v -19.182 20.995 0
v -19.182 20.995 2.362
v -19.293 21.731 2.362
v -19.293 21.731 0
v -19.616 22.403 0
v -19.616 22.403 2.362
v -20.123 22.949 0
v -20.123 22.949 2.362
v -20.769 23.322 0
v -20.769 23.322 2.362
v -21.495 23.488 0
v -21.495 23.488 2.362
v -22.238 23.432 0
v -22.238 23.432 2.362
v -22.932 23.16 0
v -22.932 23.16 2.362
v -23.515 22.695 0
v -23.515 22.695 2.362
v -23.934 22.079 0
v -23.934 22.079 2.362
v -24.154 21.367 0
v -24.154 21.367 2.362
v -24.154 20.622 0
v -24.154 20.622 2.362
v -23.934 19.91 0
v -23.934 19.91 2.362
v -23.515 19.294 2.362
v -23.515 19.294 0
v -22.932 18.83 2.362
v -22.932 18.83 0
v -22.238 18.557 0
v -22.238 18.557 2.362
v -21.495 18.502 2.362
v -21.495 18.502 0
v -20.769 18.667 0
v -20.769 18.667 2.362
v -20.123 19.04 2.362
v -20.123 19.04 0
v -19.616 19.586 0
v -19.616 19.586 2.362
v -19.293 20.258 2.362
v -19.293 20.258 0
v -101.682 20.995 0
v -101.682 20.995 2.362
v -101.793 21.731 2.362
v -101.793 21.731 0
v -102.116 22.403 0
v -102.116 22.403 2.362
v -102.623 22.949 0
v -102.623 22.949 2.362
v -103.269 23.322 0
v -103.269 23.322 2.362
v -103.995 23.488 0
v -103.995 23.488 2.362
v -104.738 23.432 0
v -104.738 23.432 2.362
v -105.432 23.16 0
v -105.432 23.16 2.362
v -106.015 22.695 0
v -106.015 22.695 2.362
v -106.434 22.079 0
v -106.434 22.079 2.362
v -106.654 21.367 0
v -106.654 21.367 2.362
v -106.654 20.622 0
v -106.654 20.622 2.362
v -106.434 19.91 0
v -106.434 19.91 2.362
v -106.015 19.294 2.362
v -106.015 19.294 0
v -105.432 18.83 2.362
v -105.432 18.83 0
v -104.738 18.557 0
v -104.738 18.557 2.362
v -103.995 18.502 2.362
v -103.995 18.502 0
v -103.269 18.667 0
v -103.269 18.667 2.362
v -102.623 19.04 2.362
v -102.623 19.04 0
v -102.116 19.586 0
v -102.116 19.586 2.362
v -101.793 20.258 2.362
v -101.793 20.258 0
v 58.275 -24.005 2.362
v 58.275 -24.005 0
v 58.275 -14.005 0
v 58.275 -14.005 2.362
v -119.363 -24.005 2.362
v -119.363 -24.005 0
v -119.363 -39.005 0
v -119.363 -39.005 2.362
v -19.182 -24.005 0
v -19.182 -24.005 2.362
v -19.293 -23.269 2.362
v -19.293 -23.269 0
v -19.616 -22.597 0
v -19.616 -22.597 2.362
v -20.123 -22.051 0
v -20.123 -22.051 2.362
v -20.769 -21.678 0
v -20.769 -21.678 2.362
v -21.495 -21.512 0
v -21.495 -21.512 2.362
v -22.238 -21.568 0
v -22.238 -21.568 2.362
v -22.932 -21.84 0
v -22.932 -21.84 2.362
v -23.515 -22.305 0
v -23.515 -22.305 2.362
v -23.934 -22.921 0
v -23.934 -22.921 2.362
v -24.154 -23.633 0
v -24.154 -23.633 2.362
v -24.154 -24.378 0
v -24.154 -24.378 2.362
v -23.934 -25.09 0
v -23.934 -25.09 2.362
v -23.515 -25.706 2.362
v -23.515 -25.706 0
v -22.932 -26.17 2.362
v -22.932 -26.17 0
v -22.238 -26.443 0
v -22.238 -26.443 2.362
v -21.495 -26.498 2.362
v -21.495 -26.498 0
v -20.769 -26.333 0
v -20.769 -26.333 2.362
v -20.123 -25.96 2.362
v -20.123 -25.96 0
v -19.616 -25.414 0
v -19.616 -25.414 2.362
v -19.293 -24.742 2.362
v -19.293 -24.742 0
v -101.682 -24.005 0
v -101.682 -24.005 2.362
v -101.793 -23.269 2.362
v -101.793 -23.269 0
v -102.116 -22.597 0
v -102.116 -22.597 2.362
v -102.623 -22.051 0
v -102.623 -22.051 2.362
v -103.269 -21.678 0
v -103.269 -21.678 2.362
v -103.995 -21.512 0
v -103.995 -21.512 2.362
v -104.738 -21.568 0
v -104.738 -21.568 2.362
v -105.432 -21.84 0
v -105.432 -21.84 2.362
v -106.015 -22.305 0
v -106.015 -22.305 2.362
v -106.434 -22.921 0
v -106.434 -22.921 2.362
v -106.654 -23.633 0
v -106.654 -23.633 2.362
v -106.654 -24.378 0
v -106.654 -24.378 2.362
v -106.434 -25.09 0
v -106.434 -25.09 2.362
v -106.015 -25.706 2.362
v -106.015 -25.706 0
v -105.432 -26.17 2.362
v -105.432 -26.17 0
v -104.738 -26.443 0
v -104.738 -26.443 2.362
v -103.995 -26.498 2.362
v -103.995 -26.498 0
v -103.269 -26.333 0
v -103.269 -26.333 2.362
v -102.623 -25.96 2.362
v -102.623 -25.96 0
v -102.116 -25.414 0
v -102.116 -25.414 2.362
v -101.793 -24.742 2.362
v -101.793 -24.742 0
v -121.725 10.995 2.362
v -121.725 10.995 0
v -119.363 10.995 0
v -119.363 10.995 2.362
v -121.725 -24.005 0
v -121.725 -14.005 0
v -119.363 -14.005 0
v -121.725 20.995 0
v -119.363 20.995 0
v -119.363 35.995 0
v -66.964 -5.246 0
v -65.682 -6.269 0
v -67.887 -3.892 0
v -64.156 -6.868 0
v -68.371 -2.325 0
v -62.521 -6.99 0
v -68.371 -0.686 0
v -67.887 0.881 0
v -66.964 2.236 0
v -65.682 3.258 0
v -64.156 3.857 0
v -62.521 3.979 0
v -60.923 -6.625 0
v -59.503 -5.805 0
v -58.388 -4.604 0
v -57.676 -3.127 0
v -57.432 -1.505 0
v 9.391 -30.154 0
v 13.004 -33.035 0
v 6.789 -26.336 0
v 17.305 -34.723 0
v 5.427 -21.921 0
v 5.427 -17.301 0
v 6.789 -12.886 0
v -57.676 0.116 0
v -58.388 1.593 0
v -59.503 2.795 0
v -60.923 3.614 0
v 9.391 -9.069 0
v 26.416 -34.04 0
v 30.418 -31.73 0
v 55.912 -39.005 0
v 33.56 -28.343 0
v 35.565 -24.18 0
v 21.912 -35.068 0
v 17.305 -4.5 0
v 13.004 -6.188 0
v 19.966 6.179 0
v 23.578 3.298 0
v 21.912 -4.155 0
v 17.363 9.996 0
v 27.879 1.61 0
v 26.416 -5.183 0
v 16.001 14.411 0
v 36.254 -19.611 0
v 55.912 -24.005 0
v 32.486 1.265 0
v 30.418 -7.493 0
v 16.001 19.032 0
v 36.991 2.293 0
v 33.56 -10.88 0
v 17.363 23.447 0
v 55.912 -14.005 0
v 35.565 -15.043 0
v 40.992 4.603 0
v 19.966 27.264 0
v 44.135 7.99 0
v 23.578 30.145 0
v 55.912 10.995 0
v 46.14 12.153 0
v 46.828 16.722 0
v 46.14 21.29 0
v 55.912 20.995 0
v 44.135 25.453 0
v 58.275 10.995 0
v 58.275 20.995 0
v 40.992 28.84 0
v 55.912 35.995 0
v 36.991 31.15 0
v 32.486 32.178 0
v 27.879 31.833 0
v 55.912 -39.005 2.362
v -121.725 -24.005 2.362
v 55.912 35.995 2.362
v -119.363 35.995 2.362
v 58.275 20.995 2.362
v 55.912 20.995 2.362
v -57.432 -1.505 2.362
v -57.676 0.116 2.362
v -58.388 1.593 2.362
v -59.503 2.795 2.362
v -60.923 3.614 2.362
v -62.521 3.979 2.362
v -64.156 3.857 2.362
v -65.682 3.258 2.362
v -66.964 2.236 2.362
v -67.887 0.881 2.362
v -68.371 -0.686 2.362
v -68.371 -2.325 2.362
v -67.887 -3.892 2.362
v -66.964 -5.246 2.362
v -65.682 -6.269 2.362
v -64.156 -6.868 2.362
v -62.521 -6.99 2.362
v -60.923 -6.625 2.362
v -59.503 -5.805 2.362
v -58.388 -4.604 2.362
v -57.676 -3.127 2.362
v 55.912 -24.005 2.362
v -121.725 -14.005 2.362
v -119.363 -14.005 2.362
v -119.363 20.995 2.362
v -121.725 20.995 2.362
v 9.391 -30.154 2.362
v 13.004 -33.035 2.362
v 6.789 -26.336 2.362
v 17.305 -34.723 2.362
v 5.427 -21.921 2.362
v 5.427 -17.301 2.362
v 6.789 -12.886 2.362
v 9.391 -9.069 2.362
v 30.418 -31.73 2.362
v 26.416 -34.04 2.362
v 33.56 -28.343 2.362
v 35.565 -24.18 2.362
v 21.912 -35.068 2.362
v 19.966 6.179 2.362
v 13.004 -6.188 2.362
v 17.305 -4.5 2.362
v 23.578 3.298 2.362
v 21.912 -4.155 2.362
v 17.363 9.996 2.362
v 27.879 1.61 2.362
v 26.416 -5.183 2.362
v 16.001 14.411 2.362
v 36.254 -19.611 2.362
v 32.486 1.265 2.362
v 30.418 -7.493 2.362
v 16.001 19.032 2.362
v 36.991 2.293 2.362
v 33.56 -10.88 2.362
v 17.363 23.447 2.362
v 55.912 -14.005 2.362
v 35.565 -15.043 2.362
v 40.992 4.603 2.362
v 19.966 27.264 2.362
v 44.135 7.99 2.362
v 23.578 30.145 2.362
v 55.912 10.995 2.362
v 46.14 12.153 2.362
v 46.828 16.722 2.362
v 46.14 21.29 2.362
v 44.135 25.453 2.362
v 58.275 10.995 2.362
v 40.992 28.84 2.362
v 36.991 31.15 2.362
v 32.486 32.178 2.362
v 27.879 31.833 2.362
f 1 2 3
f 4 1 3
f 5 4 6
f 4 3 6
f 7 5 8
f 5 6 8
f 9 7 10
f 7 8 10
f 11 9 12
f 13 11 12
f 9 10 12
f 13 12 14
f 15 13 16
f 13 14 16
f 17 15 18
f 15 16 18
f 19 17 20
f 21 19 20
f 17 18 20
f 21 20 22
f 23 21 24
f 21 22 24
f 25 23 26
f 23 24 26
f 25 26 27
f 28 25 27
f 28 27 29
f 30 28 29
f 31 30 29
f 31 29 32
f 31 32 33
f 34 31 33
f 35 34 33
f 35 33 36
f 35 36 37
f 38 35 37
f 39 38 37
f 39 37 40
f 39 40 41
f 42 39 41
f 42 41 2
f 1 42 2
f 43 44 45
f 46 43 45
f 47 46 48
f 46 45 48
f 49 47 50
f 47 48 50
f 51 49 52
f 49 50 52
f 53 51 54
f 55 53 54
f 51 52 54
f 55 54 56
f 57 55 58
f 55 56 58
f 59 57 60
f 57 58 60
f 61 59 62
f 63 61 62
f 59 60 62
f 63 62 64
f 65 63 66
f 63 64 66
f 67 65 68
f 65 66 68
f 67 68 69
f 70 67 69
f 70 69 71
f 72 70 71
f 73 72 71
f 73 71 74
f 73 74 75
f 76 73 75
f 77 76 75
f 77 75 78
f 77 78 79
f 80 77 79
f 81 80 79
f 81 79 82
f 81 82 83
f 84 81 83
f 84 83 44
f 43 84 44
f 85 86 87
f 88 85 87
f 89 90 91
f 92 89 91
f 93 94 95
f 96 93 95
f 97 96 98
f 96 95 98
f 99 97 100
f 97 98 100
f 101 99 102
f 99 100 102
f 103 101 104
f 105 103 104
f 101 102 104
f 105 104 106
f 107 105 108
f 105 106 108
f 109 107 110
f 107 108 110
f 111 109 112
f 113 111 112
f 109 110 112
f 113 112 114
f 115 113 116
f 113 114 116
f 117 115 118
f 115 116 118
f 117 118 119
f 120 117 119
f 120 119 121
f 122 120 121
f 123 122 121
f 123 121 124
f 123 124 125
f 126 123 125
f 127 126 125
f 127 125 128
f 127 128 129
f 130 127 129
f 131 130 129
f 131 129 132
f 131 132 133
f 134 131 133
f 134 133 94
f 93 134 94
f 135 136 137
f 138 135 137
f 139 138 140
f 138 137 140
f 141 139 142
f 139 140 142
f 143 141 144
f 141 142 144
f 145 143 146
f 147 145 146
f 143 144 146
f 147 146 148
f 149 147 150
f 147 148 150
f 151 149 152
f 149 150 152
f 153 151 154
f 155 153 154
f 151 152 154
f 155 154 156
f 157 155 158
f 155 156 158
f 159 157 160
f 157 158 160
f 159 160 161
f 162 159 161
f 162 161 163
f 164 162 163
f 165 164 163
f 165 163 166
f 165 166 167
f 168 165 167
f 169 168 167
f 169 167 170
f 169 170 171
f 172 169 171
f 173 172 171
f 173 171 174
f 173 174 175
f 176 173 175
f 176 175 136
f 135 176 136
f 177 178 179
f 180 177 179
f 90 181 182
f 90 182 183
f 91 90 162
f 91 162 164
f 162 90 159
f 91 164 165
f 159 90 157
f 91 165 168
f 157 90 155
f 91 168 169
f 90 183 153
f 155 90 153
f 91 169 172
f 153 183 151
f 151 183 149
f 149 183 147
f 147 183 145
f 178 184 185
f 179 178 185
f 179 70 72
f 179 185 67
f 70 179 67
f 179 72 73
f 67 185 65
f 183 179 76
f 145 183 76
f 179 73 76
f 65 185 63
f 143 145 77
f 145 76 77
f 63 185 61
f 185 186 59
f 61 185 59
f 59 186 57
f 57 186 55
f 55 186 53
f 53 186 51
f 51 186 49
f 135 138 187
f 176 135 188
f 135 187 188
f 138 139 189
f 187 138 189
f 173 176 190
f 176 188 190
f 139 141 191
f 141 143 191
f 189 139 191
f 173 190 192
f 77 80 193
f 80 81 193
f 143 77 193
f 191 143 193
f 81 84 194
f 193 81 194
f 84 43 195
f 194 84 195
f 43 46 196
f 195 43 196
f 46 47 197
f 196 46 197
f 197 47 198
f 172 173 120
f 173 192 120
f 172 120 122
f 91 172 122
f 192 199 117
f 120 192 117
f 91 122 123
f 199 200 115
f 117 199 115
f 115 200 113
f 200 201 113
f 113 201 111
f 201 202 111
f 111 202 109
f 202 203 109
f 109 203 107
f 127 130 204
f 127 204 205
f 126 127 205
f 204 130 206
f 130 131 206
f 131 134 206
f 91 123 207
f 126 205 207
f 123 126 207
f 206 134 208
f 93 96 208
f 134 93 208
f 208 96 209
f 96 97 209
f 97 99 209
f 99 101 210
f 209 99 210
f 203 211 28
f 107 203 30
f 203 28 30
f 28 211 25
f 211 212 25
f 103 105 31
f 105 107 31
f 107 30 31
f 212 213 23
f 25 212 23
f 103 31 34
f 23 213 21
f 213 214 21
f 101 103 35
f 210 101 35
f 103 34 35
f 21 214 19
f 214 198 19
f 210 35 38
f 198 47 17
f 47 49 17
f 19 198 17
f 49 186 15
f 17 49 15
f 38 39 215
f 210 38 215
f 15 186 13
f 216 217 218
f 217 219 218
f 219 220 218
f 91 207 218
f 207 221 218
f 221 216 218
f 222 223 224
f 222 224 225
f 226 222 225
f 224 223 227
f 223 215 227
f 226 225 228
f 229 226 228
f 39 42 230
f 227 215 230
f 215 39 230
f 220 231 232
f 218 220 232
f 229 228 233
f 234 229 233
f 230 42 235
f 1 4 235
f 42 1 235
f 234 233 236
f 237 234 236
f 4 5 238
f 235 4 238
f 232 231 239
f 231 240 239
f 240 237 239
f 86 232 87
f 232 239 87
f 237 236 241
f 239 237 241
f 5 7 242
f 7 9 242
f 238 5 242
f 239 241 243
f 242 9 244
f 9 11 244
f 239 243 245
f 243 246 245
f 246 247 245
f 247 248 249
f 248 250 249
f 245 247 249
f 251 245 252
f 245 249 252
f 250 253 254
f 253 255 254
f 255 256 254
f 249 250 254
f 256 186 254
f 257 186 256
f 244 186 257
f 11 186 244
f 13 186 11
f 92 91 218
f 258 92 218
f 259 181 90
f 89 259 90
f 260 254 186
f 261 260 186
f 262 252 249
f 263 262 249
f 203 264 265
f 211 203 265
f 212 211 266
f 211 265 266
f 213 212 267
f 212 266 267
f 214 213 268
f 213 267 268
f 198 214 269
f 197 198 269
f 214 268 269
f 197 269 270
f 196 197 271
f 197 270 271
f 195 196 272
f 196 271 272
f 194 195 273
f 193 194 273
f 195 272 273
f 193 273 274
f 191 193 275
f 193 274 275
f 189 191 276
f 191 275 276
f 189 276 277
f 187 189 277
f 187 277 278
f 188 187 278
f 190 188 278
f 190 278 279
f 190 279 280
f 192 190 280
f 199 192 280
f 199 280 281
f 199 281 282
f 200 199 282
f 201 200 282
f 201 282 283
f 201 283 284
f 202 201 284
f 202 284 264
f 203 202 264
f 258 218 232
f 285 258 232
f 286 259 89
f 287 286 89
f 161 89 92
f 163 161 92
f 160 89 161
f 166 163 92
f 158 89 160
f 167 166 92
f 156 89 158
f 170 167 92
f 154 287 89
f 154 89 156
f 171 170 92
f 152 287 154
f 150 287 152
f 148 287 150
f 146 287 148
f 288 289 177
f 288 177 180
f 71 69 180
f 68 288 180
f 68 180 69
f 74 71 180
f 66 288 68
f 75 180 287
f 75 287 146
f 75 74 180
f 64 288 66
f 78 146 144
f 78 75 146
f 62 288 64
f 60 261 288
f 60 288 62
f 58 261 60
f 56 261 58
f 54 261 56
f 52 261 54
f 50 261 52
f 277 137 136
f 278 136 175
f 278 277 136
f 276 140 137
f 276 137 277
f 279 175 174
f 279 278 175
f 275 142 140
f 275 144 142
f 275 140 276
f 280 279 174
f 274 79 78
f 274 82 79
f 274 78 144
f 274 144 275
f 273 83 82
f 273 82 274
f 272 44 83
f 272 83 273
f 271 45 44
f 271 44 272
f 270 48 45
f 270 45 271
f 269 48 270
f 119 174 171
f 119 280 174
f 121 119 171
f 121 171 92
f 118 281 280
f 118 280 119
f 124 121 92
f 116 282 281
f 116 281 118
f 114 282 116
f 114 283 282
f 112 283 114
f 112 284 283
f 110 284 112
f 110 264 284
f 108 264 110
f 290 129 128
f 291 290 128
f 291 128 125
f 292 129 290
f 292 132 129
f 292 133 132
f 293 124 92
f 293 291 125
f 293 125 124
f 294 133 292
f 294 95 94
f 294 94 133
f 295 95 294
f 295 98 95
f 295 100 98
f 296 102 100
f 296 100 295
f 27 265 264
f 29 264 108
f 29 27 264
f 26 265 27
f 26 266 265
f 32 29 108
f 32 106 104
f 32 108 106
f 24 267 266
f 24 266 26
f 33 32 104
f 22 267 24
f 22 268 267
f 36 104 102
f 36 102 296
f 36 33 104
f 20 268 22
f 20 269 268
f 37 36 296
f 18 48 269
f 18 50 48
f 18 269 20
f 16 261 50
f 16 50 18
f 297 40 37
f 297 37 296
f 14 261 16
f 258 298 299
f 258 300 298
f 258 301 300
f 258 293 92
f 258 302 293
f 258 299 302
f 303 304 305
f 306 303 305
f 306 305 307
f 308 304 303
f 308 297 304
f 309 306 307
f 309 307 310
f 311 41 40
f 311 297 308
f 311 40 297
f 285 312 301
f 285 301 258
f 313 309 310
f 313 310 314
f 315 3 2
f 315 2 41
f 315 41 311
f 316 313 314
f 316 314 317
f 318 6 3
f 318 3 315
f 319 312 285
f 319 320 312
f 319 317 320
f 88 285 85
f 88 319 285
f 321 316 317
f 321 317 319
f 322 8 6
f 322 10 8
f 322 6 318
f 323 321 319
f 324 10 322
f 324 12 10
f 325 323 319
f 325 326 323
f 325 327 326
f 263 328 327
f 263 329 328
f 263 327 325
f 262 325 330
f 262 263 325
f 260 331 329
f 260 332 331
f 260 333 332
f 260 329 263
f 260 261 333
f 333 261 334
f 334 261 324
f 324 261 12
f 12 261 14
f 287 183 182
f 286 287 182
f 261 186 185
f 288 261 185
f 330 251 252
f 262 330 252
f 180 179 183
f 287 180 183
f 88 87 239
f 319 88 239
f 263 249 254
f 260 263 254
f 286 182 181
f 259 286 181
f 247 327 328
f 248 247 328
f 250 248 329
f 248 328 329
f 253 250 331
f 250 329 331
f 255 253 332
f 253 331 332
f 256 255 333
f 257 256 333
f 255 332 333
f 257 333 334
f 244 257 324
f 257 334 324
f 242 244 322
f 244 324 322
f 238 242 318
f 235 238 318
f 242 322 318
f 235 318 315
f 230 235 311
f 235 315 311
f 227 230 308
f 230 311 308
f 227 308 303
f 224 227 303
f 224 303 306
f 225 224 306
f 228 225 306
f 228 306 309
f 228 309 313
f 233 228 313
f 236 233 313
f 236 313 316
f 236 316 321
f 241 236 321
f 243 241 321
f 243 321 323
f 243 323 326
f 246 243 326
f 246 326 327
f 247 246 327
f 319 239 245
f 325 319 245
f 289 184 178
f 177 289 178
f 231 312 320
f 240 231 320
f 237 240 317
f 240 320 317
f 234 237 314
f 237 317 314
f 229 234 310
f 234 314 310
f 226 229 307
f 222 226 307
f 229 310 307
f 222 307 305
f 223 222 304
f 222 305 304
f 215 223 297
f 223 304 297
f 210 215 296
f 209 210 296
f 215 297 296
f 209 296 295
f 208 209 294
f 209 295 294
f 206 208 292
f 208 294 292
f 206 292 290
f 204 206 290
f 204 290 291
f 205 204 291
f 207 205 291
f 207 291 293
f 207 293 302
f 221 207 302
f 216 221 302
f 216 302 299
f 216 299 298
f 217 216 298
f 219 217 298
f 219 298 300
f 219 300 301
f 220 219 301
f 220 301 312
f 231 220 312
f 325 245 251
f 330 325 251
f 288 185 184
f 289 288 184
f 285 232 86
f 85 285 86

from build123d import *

# Parameters (mm, degrees)
BOSS_EXTRUDE1_DEPTH = 2.3622
SKETCH2_R           = 15.5
SKETCH2_R_2         = 5.5
SKETCH2_R_3         = 2.5
CUT_EXTRUDE1_DEPTH  = 128.843896579


with BuildPart() as part:
    # Sketch1 → Boss-Extrude1 (new body)
    with BuildSketch(Plane.XY):
        Polygon((-119.363142231, 35.994577783), (-119.363142231, 20.994577783), (-121.725342231, 20.994577783), (-121.725342231, 10.994577783), (-119.363142231, 10.994577783), (-119.363142231, -14.005422217), (-121.725342231, -14.005422217), (-121.725342231, -24.005422217), (-119.363142231, -24.005422217), (-119.363142231, -39.005422217), (55.912457769, -39.005422217), (55.912457769, -24.005422217), (58.274657769, -24.005422217), (58.274657769, -14.005422217), (55.912457769, -14.005422217), (55.912457769, 10.994577783), (58.274657769, 10.994577783), (58.274657769, 20.994577783), (55.912457769, 20.994577783), (55.912457769, 35.994577783), align=None)
    extrude(amount=BOSS_EXTRUDE1_DEPTH)

    # Sketch2 → Cut-Extrude1 (cut, through all)
    with BuildSketch(Plane.XY.offset(2.3622)):
        with Locations((31.328134445, 16.721516998)):
            Circle(SKETCH2_R)
        with Locations((20.753669958, -19.61125842)):
            Circle(SKETCH2_R)
        with Locations((-62.931965905, -1.505422217)):
            Circle(SKETCH2_R_2)
        with Locations((-104.181965905, 20.994577783)):
            Circle(SKETCH2_R_3)
        with Locations((-21.681965905, 20.994577783)):
            Circle(SKETCH2_R_3)
        with Locations((-21.681965905, -24.005422217)):
            Circle(SKETCH2_R_3)
        with Locations((-104.181965905, -24.005422217)):
            Circle(SKETCH2_R_3)
    extrude(amount=-CUT_EXTRUDE1_DEPTH, mode=Mode.SUBTRACT)


solid = part.part
